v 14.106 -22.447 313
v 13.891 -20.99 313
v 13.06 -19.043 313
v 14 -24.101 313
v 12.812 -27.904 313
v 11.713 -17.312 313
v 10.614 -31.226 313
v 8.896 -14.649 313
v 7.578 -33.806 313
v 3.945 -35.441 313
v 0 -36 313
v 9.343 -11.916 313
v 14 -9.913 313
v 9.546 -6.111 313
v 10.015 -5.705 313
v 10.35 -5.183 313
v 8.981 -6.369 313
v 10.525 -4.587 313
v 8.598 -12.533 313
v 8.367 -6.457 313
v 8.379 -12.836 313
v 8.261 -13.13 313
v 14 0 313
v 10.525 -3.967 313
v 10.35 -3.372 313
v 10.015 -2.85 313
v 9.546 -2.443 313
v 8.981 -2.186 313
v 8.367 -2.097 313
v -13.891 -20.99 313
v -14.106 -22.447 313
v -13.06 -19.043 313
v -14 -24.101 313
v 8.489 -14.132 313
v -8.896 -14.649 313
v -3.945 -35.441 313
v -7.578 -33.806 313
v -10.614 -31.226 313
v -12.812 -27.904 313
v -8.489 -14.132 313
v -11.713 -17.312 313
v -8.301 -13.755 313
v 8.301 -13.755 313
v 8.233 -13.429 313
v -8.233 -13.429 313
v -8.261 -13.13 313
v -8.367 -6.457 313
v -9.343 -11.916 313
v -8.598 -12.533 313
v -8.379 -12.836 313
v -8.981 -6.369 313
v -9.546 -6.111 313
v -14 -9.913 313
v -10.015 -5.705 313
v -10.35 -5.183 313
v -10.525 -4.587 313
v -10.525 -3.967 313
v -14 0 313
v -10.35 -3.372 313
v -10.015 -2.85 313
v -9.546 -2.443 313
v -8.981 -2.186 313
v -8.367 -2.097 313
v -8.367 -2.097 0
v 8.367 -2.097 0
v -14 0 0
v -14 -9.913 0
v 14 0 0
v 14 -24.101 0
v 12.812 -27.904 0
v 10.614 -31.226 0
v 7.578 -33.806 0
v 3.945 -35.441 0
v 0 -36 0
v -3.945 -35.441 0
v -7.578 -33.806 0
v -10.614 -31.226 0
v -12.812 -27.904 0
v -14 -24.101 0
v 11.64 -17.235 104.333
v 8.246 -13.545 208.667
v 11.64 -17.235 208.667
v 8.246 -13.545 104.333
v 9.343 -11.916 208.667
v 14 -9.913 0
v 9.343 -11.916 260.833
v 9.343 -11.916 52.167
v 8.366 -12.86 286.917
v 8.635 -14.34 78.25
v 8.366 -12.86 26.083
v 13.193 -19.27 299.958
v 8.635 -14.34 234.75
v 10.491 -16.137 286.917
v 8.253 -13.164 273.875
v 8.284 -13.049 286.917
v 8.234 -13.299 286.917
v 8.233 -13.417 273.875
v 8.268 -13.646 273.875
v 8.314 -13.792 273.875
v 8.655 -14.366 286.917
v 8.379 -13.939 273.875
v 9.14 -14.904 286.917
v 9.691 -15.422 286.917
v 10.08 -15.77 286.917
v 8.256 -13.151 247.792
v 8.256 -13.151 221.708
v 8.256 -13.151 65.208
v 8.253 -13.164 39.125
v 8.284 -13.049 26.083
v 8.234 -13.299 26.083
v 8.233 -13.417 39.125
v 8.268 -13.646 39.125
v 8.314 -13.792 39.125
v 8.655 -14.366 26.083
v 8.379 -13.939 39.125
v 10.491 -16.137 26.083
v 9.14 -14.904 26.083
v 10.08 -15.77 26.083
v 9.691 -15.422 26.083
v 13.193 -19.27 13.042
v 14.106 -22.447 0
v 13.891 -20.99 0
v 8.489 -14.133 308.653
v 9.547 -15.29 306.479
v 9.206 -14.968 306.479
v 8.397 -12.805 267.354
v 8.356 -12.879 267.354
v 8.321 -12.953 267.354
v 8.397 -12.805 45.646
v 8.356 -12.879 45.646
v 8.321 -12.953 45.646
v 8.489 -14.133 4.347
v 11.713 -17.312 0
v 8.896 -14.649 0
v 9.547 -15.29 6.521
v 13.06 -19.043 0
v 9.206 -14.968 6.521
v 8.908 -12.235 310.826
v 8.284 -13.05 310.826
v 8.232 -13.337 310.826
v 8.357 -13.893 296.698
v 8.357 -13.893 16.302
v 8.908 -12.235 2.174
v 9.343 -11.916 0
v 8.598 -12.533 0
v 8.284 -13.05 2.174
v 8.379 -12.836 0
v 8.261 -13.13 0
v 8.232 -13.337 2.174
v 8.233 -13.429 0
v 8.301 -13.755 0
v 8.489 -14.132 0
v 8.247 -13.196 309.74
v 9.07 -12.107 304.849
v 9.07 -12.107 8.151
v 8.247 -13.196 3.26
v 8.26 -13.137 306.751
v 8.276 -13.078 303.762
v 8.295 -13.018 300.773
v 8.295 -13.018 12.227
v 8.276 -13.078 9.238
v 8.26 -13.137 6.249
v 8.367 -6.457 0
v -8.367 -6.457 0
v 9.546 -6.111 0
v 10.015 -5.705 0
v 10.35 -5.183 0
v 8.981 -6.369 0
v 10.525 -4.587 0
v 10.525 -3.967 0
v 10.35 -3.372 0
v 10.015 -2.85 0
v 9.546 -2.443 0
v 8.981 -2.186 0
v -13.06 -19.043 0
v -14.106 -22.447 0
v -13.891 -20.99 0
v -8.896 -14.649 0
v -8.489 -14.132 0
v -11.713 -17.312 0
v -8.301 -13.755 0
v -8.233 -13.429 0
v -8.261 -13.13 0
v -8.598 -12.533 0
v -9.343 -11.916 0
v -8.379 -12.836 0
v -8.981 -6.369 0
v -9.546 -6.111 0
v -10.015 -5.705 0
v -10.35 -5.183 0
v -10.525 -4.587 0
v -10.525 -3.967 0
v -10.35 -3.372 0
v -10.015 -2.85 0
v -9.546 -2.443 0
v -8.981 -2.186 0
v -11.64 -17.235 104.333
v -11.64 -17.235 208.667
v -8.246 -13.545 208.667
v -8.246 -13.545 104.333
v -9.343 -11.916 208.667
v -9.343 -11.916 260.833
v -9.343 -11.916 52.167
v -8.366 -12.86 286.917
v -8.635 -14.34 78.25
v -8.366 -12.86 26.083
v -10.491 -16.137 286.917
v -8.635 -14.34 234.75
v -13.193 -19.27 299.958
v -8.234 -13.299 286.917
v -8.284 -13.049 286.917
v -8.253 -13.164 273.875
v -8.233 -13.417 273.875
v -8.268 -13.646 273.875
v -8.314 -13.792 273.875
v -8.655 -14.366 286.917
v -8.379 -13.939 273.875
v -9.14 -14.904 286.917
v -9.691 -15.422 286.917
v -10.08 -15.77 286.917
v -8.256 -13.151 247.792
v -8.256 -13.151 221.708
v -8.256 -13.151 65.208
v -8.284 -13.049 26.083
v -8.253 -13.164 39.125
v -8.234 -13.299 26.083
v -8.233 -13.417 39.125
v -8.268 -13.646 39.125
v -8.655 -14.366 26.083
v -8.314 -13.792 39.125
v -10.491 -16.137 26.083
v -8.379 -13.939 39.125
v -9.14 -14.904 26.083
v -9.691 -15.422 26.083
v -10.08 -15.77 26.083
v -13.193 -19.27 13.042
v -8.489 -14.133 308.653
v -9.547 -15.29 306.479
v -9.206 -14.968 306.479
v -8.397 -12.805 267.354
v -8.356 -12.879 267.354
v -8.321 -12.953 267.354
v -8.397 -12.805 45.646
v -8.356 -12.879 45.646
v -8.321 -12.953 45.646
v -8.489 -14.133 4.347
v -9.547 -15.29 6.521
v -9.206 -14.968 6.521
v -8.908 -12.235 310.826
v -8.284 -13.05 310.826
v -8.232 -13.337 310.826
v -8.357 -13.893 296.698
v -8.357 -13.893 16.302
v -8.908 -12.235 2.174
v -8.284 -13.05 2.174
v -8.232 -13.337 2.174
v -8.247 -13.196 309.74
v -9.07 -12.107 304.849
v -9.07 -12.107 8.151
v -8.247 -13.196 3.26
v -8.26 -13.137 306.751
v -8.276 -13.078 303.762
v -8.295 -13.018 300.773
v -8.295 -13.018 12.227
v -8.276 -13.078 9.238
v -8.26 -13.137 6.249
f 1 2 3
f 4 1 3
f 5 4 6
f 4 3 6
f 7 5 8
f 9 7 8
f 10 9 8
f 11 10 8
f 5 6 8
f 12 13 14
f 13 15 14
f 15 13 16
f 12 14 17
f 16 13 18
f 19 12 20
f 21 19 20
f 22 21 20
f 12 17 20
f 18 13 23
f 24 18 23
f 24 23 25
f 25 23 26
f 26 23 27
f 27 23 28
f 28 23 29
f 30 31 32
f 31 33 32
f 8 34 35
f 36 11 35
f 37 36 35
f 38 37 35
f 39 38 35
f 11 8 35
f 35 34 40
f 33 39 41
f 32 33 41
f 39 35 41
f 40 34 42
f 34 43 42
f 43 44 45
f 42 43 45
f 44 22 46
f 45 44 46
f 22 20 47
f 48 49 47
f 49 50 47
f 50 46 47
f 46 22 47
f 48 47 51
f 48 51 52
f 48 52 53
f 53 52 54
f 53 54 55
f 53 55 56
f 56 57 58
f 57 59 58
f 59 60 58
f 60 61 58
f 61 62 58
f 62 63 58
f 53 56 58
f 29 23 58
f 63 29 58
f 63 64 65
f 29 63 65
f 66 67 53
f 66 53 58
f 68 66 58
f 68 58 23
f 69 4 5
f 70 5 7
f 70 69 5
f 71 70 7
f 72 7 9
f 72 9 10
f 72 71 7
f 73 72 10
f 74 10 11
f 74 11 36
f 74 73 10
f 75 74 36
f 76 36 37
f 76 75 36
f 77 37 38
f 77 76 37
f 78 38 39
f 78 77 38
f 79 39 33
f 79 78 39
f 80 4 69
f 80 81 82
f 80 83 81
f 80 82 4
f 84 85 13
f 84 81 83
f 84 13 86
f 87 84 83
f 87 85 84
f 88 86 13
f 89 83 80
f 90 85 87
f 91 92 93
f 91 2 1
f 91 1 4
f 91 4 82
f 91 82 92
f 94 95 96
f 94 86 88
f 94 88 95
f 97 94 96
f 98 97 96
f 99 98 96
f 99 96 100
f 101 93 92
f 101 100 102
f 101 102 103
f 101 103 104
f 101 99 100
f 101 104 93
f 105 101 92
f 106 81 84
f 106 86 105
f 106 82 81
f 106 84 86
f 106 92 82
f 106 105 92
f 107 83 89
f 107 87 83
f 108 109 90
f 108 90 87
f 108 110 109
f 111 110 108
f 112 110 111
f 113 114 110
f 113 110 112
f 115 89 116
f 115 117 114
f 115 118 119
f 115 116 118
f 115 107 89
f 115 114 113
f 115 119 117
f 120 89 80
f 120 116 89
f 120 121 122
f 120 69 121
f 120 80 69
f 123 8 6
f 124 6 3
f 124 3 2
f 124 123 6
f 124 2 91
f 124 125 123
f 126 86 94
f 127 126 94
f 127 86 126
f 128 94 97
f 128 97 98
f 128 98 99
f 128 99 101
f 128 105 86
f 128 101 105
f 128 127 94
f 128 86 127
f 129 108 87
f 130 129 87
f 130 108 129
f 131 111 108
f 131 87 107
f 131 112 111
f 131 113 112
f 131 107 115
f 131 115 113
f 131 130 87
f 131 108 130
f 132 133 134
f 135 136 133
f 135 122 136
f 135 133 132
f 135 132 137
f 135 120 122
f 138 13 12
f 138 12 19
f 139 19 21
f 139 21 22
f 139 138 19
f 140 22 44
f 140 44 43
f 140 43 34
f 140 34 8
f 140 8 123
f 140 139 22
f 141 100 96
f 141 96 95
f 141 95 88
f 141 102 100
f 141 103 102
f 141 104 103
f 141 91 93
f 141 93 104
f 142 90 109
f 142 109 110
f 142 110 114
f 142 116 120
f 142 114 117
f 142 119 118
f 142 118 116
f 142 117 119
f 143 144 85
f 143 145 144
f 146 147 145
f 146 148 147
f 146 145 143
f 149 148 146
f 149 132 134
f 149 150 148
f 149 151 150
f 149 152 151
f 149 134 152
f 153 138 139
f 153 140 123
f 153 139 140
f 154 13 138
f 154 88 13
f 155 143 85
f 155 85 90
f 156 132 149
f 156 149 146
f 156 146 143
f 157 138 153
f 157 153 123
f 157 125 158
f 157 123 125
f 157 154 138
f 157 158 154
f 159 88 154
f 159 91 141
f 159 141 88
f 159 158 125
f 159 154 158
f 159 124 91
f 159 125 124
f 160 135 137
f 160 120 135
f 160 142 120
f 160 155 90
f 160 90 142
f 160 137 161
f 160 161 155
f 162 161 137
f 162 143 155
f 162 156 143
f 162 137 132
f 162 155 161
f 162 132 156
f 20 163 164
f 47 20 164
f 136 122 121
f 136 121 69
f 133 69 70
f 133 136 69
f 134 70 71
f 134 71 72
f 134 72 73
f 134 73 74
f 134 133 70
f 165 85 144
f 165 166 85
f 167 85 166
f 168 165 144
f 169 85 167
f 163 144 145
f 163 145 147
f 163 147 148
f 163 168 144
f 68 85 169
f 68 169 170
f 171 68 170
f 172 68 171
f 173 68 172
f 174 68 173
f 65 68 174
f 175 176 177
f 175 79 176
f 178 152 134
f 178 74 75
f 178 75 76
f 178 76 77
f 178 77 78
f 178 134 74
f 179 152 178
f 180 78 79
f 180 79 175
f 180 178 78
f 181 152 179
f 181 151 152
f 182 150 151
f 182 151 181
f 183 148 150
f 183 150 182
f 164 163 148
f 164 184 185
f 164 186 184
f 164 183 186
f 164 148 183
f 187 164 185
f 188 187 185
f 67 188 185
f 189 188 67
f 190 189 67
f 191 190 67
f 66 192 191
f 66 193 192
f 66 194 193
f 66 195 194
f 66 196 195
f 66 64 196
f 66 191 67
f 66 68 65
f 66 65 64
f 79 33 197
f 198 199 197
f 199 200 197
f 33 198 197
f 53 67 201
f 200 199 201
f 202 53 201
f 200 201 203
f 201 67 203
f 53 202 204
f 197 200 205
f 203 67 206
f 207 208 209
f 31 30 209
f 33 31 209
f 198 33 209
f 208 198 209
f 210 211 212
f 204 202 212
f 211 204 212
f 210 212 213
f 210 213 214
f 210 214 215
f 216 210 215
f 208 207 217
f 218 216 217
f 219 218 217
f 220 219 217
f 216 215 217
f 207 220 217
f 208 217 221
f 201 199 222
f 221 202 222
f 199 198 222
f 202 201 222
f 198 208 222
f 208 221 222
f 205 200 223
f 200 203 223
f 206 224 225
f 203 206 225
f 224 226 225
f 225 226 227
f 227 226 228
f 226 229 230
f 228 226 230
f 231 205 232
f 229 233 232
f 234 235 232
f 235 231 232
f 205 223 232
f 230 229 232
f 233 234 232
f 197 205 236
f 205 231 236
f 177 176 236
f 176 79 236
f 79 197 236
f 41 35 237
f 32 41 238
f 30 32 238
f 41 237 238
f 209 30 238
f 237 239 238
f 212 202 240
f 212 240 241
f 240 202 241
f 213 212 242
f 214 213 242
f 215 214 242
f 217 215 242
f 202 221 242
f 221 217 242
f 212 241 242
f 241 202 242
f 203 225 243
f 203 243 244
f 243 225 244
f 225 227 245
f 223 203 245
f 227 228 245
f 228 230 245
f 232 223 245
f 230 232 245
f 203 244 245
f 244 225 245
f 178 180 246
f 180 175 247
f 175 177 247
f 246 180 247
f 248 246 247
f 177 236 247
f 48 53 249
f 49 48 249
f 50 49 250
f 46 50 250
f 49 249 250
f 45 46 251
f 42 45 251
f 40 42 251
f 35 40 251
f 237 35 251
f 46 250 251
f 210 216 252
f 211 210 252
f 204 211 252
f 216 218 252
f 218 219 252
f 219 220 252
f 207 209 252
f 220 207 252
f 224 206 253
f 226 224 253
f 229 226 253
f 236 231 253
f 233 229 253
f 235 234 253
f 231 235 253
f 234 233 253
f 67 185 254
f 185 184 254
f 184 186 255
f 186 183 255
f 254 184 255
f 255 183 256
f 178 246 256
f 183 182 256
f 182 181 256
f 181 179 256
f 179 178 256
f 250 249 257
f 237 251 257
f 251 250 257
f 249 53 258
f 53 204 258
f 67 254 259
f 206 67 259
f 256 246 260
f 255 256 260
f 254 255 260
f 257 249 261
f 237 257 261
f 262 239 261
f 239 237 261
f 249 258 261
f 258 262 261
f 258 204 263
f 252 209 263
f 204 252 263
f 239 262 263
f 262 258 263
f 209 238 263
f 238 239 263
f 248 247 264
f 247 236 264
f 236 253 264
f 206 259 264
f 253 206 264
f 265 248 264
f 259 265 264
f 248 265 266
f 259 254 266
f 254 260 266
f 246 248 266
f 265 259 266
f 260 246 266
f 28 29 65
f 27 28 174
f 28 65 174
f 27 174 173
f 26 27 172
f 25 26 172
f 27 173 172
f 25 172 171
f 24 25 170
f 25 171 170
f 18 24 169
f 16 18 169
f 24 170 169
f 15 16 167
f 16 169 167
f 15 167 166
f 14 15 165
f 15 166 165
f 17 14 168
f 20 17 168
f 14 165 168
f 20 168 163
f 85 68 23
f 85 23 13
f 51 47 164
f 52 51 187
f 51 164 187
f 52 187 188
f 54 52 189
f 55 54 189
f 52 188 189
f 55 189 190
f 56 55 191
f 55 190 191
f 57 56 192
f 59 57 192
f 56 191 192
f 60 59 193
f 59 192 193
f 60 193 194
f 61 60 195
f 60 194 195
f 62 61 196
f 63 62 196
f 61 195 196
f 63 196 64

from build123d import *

# Parameters (mm, degrees)
BOSS_EXTRU_1_DEPTH = 313


with BuildPart() as part:
    # Esquisse1 → Boss.-Extru.1 (new body)
    with BuildSketch(Plane.XY):
        with BuildLine():
            Line((-14, 0), (14, 0))
            Line((14, 0), (14, -9.913263158))
            add(Edge.make_bspline(
                [(14, -9.913263158), (0.278502062, -14.553498897), (15.550273166, -14.609095678), (14, -24.101052632)],
                knots=[0, 0, 0, 0, 1, 1, 1, 1], degree=3))
            ThreePointArc((14, -24.101052632), (0, -36), (-14, -24.101052632))
            add(Edge.make_bspline(
                [(-14, -9.913263158), (-0.278502062, -14.553498897), (-15.550273166, -14.609095678), (-14, -24.101052632)],
                knots=[0, 0, 0, 0, 1, 1, 1, 1], degree=3))
            Line((-14, -9.913263158), (-14, 0))
        make_face()
        with BuildLine():
            Line((-8.367157895, -2.097271975), (8.367157895, -2.097271975))
            ThreePointArc((8.367157895, -2.097271975), (10.547051834, -4.277165914), (8.367157895, -6.457059853))
            Line((8.367157895, -6.457059853), (-8.367157895, -6.457059853))
            ThreePointArc((-8.367157895, -6.457059853), (-10.547051834, -4.277165914), (-8.367157895, -2.097271975))
        make_face(mode=Mode.SUBTRACT)
    extrude(amount=BOSS_EXTRU_1_DEPTH)


solid = part.part
